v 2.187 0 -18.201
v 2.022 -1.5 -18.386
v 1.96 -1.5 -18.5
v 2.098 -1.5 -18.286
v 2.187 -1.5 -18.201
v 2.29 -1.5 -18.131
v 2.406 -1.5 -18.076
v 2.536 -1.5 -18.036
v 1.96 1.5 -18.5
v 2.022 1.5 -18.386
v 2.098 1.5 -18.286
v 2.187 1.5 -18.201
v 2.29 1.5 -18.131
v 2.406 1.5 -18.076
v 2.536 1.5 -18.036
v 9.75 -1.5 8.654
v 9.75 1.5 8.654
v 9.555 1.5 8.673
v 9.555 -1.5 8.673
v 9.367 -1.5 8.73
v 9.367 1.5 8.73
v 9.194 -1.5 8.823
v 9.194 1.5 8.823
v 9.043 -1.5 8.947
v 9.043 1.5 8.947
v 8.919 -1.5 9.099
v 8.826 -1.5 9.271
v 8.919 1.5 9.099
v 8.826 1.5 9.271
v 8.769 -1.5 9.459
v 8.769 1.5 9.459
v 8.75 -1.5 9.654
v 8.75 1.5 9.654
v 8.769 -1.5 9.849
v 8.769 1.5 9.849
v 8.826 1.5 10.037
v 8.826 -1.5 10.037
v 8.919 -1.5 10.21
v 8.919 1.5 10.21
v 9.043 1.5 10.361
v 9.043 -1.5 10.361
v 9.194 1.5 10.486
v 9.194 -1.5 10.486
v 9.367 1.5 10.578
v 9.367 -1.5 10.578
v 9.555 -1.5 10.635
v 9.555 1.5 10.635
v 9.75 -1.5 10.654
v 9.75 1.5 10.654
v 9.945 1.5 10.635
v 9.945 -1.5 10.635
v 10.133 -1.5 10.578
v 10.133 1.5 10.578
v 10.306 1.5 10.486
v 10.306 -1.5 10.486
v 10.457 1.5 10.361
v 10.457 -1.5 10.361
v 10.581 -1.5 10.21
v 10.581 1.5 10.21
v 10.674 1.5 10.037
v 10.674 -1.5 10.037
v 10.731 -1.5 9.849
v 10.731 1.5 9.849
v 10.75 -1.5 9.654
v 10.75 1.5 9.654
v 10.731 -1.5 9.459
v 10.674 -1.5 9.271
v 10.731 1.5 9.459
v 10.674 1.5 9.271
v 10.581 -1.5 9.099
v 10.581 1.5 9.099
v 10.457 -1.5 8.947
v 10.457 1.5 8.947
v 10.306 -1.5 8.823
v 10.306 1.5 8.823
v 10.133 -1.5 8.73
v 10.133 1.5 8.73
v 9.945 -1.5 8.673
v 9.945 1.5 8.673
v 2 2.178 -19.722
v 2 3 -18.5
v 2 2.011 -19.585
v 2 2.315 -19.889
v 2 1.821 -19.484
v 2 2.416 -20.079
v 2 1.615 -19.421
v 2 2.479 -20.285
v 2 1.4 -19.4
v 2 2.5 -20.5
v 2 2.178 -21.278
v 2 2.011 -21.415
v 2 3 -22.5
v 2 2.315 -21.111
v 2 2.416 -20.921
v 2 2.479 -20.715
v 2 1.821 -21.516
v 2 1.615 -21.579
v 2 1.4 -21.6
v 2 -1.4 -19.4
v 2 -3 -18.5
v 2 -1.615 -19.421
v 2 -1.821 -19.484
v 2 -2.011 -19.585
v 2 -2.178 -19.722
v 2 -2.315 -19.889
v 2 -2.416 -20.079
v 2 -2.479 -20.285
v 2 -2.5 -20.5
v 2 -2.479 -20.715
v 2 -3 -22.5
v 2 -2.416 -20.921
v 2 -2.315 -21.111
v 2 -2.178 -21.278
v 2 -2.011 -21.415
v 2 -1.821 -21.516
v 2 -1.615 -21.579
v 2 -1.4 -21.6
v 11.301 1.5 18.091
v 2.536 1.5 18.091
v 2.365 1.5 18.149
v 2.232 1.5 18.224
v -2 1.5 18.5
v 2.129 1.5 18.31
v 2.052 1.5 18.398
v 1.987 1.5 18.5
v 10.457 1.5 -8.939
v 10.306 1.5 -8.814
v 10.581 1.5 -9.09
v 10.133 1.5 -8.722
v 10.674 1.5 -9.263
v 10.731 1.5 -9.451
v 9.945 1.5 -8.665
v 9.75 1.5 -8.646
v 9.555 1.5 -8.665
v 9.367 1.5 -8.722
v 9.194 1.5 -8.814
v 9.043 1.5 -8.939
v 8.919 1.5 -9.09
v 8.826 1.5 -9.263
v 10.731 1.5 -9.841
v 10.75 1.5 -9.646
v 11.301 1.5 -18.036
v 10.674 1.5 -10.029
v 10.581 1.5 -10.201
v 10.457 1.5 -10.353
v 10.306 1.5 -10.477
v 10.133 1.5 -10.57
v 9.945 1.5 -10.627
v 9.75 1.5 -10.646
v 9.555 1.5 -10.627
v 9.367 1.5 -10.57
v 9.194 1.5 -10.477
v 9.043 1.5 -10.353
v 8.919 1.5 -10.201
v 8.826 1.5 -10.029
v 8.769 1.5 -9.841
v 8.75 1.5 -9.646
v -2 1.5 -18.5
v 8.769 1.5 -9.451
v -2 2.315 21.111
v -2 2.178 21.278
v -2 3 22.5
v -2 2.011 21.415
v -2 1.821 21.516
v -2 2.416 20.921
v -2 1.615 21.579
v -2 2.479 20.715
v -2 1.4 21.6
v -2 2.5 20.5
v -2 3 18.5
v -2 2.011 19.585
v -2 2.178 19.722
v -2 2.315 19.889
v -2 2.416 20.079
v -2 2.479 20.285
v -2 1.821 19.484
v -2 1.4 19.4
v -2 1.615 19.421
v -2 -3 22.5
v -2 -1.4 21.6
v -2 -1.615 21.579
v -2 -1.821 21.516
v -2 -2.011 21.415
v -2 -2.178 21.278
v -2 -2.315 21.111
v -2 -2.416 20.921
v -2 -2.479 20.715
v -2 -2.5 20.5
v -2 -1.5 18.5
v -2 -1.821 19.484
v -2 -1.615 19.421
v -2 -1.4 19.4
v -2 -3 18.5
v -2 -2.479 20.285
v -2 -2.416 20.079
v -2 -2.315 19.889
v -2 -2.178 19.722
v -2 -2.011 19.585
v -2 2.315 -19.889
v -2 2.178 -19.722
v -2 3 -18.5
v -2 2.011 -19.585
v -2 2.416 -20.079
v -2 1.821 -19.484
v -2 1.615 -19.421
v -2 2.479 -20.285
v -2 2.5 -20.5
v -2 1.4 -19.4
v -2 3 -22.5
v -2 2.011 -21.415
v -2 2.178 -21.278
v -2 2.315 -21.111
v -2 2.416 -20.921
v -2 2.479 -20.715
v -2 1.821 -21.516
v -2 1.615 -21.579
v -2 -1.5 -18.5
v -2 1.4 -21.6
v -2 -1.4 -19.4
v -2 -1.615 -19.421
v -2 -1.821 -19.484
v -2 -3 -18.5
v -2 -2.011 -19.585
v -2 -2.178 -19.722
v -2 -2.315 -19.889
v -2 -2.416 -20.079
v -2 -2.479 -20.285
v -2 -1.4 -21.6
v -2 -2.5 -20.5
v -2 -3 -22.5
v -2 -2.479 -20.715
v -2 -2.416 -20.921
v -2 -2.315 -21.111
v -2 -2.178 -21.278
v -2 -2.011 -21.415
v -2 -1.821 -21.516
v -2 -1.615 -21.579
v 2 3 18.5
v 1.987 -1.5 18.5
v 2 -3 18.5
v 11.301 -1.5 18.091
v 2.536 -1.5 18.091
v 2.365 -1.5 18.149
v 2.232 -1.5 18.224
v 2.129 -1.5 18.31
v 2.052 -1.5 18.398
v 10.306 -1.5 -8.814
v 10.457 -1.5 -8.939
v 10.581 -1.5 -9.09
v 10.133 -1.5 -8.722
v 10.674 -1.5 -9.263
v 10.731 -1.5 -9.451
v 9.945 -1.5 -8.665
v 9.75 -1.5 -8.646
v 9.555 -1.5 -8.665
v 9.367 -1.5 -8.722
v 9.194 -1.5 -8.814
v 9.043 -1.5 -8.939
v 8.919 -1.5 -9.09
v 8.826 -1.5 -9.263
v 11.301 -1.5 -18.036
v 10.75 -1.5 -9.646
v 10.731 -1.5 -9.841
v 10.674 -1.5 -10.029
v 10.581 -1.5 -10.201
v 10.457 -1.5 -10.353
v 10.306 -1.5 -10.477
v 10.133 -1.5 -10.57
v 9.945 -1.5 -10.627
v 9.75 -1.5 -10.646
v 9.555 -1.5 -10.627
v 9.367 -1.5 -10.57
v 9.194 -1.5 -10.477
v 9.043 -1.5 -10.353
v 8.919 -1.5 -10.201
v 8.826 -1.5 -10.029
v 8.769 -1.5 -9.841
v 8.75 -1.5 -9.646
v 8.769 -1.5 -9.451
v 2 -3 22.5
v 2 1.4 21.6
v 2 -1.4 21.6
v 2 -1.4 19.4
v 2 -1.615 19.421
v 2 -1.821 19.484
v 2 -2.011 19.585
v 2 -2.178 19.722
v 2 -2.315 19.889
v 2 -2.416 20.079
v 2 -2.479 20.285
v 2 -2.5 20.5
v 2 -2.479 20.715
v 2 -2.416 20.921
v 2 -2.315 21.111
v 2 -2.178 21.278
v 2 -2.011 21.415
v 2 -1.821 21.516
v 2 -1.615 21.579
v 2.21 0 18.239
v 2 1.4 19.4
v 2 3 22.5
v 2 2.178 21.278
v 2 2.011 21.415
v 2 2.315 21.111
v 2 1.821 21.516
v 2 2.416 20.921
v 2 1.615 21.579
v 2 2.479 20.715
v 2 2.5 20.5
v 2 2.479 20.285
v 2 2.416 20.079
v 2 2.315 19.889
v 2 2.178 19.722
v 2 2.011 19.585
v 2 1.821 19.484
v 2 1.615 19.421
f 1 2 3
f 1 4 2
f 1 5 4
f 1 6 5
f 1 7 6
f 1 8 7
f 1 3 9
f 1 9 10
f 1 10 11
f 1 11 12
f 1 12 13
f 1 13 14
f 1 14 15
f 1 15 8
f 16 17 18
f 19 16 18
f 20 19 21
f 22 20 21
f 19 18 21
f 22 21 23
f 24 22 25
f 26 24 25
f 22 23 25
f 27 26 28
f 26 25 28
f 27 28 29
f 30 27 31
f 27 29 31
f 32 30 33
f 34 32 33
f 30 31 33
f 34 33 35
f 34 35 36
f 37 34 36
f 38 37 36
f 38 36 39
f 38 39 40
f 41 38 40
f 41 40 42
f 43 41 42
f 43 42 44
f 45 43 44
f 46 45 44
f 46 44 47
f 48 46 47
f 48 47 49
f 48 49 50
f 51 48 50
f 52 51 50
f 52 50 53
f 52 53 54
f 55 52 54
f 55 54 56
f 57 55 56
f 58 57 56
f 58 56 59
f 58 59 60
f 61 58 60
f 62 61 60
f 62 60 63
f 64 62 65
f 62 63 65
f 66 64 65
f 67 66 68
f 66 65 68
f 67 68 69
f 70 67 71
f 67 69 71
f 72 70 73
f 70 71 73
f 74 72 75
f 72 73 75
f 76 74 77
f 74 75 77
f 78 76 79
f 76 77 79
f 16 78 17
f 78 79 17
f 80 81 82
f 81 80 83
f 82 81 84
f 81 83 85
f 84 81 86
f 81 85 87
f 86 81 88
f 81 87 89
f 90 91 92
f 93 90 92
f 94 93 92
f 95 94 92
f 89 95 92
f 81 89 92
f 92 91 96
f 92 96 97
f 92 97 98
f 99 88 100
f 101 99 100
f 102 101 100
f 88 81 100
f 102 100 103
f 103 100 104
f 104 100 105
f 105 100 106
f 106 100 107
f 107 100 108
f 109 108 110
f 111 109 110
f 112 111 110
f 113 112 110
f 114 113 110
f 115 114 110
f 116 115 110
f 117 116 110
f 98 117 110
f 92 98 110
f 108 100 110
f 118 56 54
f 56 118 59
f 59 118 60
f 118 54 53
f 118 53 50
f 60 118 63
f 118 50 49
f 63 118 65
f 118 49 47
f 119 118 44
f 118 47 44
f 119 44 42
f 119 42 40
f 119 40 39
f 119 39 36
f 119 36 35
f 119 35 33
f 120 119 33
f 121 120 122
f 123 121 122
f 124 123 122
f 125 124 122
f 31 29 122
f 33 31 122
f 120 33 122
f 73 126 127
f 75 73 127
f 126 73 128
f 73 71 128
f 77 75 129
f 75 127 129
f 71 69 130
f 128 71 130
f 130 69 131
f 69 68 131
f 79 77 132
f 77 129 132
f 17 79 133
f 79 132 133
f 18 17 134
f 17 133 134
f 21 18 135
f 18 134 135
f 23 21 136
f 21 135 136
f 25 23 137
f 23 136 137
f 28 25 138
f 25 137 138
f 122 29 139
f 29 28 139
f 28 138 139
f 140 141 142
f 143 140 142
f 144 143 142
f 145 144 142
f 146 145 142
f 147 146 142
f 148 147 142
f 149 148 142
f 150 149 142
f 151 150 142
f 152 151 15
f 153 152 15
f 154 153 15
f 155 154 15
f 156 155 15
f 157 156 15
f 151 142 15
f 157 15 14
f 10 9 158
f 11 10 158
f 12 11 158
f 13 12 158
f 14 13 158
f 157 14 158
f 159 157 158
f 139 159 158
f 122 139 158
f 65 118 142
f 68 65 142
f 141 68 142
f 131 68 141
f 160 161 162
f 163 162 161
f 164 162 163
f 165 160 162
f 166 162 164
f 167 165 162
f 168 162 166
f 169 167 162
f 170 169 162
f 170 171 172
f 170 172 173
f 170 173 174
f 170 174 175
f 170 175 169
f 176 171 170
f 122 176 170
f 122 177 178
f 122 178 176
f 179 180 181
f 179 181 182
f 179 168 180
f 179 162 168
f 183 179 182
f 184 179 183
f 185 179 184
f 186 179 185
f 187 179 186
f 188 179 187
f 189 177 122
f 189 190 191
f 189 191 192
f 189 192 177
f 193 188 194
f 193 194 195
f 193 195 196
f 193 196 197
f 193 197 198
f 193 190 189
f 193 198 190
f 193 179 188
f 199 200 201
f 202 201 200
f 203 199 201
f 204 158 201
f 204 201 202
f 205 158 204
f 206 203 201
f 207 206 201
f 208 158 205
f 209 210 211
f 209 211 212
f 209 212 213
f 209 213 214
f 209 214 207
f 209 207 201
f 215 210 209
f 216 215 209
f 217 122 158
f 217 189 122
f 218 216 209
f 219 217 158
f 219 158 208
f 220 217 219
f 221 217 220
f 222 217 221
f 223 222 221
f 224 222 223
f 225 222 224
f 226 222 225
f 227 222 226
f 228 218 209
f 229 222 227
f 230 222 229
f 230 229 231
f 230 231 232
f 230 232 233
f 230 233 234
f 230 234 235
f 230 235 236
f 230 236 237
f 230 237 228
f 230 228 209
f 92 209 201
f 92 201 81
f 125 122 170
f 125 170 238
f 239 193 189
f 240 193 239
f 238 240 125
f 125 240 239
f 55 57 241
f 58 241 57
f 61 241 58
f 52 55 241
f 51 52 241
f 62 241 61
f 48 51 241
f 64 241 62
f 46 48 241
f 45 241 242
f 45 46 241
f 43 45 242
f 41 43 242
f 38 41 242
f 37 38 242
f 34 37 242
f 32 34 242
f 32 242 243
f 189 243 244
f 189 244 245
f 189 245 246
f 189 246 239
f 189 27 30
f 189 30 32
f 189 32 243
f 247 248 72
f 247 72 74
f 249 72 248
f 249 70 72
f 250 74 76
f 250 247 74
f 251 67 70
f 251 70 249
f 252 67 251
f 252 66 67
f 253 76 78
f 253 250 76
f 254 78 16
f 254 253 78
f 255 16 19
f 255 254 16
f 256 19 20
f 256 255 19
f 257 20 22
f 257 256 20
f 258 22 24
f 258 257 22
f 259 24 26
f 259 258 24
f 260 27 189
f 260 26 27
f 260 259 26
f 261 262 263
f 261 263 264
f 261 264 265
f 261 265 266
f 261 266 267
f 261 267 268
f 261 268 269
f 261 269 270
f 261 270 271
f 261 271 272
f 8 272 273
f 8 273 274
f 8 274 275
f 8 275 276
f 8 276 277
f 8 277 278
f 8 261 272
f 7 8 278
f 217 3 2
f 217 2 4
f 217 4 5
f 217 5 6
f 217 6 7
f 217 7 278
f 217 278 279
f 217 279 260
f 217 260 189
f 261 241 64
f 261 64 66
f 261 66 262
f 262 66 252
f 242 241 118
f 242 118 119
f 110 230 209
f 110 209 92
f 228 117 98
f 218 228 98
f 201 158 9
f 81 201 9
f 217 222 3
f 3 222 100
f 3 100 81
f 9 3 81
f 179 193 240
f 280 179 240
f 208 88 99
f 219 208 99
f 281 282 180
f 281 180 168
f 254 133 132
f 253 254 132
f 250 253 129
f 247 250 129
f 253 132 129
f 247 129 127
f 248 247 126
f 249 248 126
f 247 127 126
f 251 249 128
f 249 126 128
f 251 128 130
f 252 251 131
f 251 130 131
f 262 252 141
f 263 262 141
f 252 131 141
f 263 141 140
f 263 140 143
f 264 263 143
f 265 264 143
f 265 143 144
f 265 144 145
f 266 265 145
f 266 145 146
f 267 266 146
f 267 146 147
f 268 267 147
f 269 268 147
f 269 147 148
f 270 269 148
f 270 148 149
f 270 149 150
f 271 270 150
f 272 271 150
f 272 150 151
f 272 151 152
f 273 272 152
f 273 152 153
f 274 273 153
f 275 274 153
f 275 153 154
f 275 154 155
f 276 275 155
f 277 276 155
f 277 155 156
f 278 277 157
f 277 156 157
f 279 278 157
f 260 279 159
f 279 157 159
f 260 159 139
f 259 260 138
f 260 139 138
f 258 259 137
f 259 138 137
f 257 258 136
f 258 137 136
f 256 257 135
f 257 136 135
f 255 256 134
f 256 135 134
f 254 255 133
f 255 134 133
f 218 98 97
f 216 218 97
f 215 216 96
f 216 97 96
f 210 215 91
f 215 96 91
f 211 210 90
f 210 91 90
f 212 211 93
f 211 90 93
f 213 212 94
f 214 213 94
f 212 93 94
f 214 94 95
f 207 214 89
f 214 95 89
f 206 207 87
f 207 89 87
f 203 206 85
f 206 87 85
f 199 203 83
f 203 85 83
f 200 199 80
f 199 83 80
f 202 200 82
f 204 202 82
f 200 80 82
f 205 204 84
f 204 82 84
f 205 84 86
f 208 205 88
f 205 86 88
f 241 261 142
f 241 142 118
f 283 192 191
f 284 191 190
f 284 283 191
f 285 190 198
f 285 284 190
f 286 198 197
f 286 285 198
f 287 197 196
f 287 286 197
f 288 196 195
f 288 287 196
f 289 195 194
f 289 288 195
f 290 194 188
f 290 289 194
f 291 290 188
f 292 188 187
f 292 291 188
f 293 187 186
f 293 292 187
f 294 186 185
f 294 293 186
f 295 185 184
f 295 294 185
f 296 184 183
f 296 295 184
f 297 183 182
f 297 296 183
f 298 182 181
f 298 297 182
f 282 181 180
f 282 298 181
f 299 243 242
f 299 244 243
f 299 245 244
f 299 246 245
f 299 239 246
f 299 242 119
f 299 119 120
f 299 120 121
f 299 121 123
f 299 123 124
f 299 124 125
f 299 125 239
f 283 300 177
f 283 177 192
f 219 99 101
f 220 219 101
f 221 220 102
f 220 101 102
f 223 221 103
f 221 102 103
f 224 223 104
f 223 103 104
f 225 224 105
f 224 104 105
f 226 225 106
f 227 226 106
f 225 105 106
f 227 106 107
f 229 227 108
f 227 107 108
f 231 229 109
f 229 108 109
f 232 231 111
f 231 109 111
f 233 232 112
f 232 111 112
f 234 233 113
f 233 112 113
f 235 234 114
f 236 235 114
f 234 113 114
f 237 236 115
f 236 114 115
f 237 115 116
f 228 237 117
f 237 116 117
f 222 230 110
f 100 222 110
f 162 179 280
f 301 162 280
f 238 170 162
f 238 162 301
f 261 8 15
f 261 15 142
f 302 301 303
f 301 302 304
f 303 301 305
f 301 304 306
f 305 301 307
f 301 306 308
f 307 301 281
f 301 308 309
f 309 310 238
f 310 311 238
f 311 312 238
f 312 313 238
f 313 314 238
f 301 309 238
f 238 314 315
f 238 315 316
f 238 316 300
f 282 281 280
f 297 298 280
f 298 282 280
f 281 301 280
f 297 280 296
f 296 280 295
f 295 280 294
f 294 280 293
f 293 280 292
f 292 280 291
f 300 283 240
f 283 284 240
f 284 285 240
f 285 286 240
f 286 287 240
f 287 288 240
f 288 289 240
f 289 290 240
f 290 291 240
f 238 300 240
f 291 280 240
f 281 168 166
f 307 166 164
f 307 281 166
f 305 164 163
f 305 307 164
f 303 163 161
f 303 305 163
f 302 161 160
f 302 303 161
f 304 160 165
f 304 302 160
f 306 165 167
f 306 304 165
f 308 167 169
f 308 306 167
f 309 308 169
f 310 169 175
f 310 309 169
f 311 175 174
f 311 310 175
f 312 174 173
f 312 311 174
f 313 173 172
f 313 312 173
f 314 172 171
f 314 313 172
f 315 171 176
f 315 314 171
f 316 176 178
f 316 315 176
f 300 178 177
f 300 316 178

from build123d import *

# Parameters (mm, degrees)
BOSS_EXTRU_1_DEPTH        = 3
BOSS_EXTRU_1_DEPTH_BACK   = 3
ESQUISSE1_W               = 4
ESQUISSE1_H               = 4
BOSS_EXTRU_1_2_DEPTH      = 3
BOSS_EXTRU_1_2_DEPTH_BACK = 3
BOSS_EXTRU_2_DEPTH        = 1.5
BOSS_EXTRU_2_DEPTH_BACK   = 1.5
ESQUISSE4_R               = 1
ENL_V_MAT_EXTRU_1_DEPTH   = 21.5
ENL_V_MAT_EXTRU_2_DEPTH   = 21.5


with BuildPart() as part:
    # Esquisse1 → Boss.-Extru.1 (new, two sides: drawn at the far end of the back side and taken through both)
    with BuildSketch(Plane(origin=(0, 0, 0), x_dir=(1, 0, 0), z_dir=(0, 1, 0)).offset(-BOSS_EXTRU_1_DEPTH_BACK)):
        with Locations((0, 20.5)):
            Rectangle(ESQUISSE1_W, ESQUISSE1_H)
    extrude(amount=BOSS_EXTRU_1_DEPTH + BOSS_EXTRU_1_DEPTH_BACK)



with BuildPart() as body_2:
    # Esquisse1 → Boss.-Extru.1 2 (new, two sides: drawn at the far end of the back side and taken through both)
    with BuildSketch(Plane(origin=(0, 0, 0), x_dir=(1, 0, 0), z_dir=(0, 1, 0)).offset(-BOSS_EXTRU_1_2_DEPTH_BACK)):
        with Locations((0, -20.5)):
            Rectangle(ESQUISSE1_W, ESQUISSE1_H)
    extrude(amount=BOSS_EXTRU_1_2_DEPTH + BOSS_EXTRU_1_2_DEPTH_BACK)


with BuildPart() as part_1:
    add(part.part)

    add(body_2.part)  # Boss.-Extru.2 merges body 2
    # Esquisse3 → Boss.-Extru.2 (add, two sides: drawn at the far end of the back side and taken through both)
    with BuildSketch(Plane(origin=(0, 0, 0), x_dir=(1, 0, 0), z_dir=(0, 1, 0)).offset(-BOSS_EXTRU_2_DEPTH_BACK)):
        with BuildLine():
            Line((-2, 18.571568884), (1.93, 18.571568884))
            add(Edge.make_bspline(
                [(1.93, 18.571568884), (2.088145302, 18.144214449), (2.536201665, 18.035775419)],
                knots=[0, 0, 0, 1, 1, 1], degree=2))
            Line((2.536201665, 18.035775419), (11.300625785, 18.035775419))
            Line((11.300625785, 18.035775419), (11.300625785, -18.091491534))
            Line((11.300625785, -18.091491534), (2.536201665, -18.091491534))
            add(Edge.make_bspline(
                [(2.536201665, -18.091491534), (2.088145302, -18.199930564), (1.93, -18.627284999)],
                knots=[0, 0, 0, 1, 1, 1], degree=2))
            Line((1.93, -18.627284999), (-2, -18.627284999))
            Line((-2, -18.627284999), (-2, 18.571568884))
        make_face()
    extrude(amount=BOSS_EXTRU_2_DEPTH + BOSS_EXTRU_2_DEPTH_BACK)

    # Esquisse4 → Enlèv. mat.-Extru.1 (cut)
    with BuildSketch(Plane(origin=(0, 1.5, 0), x_dir=(1, 0, 0), z_dir=(0, 1, 0))):
        with Locations((9.75, 9.645867946)):
            Circle(ESQUISSE4_R)
        with Locations((9.75, -9.654132054)):
            Circle(ESQUISSE4_R)
    extrude(amount=-ENL_V_MAT_EXTRU_1_DEPTH, mode=Mode.SUBTRACT)

    # Esquisse5 → Enlèv. mat.-Extru.2 (cut)
    with BuildSketch(Plane(origin=(2, 0, 0), x_dir=(0, 0, -1), z_dir=(1, 0, 0))):
        with BuildLine():
            Line((-19.4, 1.4), (-19.4, -1.4))
            ThreePointArc((-19.4, -1.4), (-20.5, -2.5), (-21.6, -1.4))
            Line((-21.6, -1.4), (-21.6, 1.4))
            ThreePointArc((-21.6, 1.4), (-20.5, 2.5), (-19.4, 1.4))
        make_face()
        with BuildLine():
            Line((19.4, 1.4), (19.4, -1.4))
            ThreePointArc((19.4, -1.4), (20.5, -2.5), (21.6, -1.4))
            Line((21.6, -1.4), (21.6, 1.4))
            ThreePointArc((21.6, 1.4), (20.5, 2.5), (19.4, 1.4))
        make_face()
    extrude(amount=-ENL_V_MAT_EXTRU_2_DEPTH, mode=Mode.SUBTRACT)


solid = part_1.part
